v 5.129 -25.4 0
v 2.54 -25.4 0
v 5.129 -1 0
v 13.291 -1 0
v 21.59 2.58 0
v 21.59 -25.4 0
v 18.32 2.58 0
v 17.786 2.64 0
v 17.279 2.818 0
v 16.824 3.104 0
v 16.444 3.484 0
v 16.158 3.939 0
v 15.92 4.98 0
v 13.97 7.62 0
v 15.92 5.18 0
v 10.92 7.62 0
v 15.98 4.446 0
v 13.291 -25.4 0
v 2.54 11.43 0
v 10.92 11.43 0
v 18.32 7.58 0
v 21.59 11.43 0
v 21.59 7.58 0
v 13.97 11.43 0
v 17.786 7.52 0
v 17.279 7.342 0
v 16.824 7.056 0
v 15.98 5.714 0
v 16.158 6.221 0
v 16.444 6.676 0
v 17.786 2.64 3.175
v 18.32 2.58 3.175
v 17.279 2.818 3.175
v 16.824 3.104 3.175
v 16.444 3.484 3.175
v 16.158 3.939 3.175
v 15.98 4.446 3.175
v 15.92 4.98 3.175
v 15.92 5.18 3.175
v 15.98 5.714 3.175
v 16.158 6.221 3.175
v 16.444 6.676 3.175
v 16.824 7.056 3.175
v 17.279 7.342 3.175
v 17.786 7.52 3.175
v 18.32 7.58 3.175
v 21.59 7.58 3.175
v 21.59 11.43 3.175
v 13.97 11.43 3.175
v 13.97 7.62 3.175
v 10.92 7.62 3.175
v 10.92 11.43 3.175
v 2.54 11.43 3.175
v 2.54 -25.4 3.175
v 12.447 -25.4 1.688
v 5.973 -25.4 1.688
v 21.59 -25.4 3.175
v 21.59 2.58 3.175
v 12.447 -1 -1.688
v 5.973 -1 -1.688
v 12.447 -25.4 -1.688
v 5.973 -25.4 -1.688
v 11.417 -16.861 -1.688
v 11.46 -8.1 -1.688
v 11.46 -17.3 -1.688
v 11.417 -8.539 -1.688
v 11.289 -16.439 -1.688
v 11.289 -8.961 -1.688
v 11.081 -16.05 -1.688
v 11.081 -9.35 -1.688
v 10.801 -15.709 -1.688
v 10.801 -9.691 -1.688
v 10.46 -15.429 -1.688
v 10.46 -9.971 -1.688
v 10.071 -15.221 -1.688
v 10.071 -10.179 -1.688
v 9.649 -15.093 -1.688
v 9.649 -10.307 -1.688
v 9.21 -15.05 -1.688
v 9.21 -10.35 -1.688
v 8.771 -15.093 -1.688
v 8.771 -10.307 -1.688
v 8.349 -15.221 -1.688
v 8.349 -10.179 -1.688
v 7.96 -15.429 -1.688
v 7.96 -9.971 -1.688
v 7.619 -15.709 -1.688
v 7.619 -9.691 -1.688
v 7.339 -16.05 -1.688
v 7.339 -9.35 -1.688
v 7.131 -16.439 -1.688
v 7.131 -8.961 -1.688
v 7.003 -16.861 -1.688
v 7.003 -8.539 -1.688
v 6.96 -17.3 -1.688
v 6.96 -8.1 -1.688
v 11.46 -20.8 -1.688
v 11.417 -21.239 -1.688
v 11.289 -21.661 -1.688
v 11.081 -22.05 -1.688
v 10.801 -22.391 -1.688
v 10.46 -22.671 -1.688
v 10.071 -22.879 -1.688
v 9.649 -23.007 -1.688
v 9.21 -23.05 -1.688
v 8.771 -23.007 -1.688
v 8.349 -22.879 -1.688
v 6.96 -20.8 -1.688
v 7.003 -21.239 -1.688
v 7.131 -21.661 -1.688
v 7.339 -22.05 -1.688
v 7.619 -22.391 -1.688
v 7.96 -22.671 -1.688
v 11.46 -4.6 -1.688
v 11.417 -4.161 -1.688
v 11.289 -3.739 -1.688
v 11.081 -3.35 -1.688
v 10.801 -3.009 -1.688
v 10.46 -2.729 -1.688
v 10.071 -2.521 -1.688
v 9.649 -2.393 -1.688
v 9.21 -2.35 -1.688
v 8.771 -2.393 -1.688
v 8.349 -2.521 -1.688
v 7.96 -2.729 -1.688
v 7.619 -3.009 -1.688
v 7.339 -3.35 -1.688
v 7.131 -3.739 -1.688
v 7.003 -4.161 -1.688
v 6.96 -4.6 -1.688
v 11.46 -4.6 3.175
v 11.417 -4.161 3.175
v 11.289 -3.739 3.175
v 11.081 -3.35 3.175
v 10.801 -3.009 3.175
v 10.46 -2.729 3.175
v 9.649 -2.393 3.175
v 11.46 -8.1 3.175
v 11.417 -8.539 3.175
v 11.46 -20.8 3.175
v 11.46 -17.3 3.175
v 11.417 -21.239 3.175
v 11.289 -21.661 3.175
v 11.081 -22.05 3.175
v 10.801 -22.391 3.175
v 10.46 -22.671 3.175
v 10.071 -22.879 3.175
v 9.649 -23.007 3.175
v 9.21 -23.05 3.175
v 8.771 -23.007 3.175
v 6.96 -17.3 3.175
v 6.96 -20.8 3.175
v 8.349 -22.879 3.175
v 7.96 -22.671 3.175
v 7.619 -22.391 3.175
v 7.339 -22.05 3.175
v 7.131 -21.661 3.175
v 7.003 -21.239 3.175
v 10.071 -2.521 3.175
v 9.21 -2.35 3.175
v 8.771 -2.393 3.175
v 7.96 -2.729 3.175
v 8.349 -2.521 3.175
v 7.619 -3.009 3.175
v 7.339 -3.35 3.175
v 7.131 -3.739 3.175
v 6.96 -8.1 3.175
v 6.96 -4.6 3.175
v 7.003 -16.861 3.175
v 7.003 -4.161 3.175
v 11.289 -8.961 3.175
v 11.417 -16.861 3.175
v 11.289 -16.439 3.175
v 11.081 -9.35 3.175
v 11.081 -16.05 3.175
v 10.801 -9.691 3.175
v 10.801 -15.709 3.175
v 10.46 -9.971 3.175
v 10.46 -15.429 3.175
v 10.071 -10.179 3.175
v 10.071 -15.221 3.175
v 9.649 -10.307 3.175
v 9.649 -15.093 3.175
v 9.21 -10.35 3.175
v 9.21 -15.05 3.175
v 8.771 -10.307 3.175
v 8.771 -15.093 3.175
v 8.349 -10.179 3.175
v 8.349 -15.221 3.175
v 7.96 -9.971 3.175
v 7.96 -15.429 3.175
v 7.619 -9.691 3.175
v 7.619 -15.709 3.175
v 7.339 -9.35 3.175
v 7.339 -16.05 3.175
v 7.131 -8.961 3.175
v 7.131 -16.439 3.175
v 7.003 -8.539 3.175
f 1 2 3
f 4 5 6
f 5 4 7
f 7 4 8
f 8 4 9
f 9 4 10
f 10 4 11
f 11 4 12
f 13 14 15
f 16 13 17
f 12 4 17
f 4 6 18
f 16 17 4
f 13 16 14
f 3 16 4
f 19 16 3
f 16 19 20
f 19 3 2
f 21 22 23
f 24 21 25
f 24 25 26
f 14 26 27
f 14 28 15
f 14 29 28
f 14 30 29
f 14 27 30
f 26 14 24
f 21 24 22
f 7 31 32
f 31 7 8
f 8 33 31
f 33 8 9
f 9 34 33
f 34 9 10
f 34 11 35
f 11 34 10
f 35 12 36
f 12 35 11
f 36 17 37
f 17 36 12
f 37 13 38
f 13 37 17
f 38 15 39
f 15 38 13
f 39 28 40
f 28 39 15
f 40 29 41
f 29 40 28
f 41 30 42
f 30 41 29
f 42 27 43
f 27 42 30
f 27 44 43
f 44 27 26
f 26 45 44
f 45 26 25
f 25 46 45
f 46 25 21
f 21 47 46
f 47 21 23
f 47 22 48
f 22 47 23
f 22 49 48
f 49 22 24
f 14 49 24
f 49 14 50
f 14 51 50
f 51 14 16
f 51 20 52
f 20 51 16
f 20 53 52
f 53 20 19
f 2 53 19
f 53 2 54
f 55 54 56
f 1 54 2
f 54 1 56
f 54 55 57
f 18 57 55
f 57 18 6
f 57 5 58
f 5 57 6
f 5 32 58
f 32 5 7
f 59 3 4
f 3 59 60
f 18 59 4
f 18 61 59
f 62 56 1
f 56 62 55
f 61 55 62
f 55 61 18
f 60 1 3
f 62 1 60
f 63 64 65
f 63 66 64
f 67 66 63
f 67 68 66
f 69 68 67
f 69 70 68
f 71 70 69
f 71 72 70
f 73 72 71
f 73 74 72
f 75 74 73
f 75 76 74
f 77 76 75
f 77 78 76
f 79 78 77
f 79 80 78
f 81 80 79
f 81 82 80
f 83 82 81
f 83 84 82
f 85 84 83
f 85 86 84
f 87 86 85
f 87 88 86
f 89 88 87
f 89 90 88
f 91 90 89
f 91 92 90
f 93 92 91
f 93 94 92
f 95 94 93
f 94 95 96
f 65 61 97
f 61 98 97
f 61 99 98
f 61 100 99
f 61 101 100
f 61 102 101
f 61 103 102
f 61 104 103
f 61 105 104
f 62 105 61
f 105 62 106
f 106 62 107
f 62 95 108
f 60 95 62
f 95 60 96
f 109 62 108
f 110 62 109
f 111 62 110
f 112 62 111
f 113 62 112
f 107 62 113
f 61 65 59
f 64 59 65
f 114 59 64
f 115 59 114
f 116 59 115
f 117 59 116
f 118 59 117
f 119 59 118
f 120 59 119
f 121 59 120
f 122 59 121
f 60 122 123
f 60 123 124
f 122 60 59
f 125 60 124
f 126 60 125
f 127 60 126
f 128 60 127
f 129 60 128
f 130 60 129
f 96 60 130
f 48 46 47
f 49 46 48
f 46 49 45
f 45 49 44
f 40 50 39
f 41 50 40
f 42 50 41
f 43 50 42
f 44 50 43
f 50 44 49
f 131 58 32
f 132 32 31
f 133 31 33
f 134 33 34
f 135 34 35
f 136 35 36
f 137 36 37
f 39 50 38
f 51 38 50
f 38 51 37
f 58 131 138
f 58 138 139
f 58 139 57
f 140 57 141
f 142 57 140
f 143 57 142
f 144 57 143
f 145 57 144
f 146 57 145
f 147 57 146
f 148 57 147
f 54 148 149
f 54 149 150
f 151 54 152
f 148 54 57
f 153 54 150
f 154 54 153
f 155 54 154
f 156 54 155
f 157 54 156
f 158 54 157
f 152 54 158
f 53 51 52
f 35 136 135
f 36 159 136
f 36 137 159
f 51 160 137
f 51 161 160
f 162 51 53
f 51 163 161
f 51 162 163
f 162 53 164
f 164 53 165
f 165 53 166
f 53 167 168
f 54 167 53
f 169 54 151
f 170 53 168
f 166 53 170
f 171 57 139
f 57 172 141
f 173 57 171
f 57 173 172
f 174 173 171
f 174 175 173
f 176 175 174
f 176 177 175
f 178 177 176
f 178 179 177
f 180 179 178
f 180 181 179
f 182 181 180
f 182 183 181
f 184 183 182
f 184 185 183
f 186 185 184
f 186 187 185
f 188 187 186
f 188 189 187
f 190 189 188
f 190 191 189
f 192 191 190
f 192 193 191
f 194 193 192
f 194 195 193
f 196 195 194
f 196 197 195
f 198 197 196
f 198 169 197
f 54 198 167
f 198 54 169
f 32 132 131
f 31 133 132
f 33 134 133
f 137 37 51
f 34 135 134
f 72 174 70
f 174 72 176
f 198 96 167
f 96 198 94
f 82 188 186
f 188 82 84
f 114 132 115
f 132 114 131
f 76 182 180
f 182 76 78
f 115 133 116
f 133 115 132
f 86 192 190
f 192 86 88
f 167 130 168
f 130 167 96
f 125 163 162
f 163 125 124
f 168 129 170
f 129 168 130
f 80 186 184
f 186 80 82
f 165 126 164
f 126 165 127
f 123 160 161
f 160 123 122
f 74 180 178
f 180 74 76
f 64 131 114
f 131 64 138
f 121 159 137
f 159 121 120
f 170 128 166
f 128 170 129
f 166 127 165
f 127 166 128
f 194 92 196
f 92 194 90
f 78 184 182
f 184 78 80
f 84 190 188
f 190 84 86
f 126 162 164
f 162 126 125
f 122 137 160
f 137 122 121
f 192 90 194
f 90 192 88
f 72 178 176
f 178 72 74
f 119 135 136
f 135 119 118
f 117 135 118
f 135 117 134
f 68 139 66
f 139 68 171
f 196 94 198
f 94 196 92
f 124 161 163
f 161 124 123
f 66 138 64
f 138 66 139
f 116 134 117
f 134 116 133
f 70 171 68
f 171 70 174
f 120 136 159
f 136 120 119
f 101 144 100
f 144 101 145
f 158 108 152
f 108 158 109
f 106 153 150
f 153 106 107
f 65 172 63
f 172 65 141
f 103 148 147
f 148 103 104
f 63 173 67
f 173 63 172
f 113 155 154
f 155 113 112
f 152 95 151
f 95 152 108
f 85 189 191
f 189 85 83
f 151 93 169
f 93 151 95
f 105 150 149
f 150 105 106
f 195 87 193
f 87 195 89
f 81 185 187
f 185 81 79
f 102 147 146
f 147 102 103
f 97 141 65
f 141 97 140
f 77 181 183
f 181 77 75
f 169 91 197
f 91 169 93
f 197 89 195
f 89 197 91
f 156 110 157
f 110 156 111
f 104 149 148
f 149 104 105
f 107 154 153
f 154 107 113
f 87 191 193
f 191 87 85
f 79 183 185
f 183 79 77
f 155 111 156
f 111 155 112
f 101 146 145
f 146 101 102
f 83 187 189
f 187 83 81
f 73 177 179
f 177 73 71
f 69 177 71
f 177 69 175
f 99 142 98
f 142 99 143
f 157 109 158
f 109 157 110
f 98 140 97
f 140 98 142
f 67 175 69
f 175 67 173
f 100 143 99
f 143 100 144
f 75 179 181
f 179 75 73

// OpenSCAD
// file: ../lib/TOGComplexLib1.scad
function tcplx1_multiply(a, b) =
	[a[0]*b[0] - a[1]*b[1], a[0]*b[1] + a[1]*b[0]];
function tcplx1_divide(a, b) =
	let(bot = (b[0]*b[0] + b[1]*b[1]))
	[
		(a[0]*b[0] + a[1]*b[1])/bot,
		(a[1]*b[0] - a[0]*b[1])/bot
	];

assert([-11,23] == tcplx1_multiply([3,2], [1,7]));

assert([-1,3] == tcplx1_multiply([3,1], [0,1]));
assert([-1,3] == tcplx1_multiply([0,1], [3,1]));

echo(tcplx1_divide([-1,3], [3,1]));
assert([0,1] == tcplx1_divide([-1,3], [3,1]));

function tcplx1_normalize(vec) =
	let(veclen = sqrt(vec[0]*vec[0]+vec[1]*vec[1]))
	[vec[0] / veclen, vec[1] / veclen];

function tcplx1_relative_turnvec_vv(v0, v1) =
	tcplx1_divide(tcplx1_normalize(v1), tcplx1_normalize(v0));

function tcplx1_relative_turnvec_abc(p0, p1, p2) = tcplx1_relative_turnvec_vv(p1-p0, p2-p1);

// A 90-degree turn
assert([0,1] == tcplx1_relative_turnvec_abc([0,0], [1,0], [1,1]));
assert([0,1] == tcplx1_relative_turnvec_abc([0,0], [0,1], [-1,1]));

// A 45-degree turn
assert(tcplx1_normalize([1,1]) == tcplx1_relative_turnvec_abc([0,0], [1,0], [ 2,1]));
assert(tcplx1_normalize([1,1]) == tcplx1_relative_turnvec_abc([0,0], [0,1], [-1,2]));


function tcplx1_relative_angle_abc(p0, p1, p2) =
	let(turnvec = tcplx1_relative_turnvec_abc(p0, p1, p2))
	atan2(turnvec[1], turnvec[0]);

assert(-135 == tcplx1_relative_angle_abc([0,0], [1,0], [0,-1]));
assert( -90 == tcplx1_relative_angle_abc([0,0], [1,0], [1,-1]));
assert(   0 == tcplx1_relative_angle_abc([0,0], [1,0], [2, 0]));
assert(  90 == tcplx1_relative_angle_abc([0,0], [1,0], [1, 1]));
assert( 135 == tcplx1_relative_angle_abc([0,0], [1,0], [0, 1]));

assert(  90 == tcplx1_relative_angle_abc([1,1], [3,3], [1, 5]));
// file: ../lib/TOGArrayLib1.scad
// TOGArrayLib1.5
// 
// Functions for working with arrays.
// 
// v1.1:
// - tal1_reduce assert(is_list(items)) to prevent infinite recursion
//   when given undefined or other non-list values
// v1.1.1:
// - Fix tal1_uniq_remap_v2 to return "list-remap-result" as the
//   first element of the returned list
// v1.2:
// - Add tal1_replace_at function
// v1.3:
// - tal1_is_vec_of, tal1_is_vec_of_num
// v1.4:
// - tal1_assert_for_each, for when you want to assert something
//   about each of a list of items and get nice failure messages
// v1.5:
// - Add tal1_duplicate_reversed function, which may be
//   handy when generating symmetrical polygons and stuff.

/**
 * Make a list with the contents of list `a`,
 * but starting at offset `off`, replaced by the contents of list `b`.
 * len(result) = max(len(a), off+len(b))
 */
function tal1_replace_at(a, off, b, default_value=undef, default_value_function=undef) =
	assert(is_list(a))
	assert(is_list(b))
	let( _dvf = !is_undef(default_value_function) ? default_value_function : function(i) default_value )
[
	for( i=[0:1:min(off,len(a))-1] ) a[i],
	for( i=[len(a):1:off-1] ) _dvf(i),
	for( i=[off:1:off+len(b)-1] ) b[i-off],
	for( i=[off+len(b):1:len(a)-1] ) a[i],
];

// Simplest case
assert([] == tal1_replace_at([], 0, []));
// Second simplest cases
assert(["foo"] == tal1_replace_at(["foo"], 0, []));
assert(["foo"] == tal1_replace_at([], 0, ["foo"]));
// Replace one item
assert(["foo","quux","baz"] == tal1_replace_at(["foo","bar","baz"], 1, ["quux"]));
// Replace and extend
assert(["foo","quux","tuna","tina"] == tal1_replace_at(["foo","bar","baz"], 1, ["quux", "tuna", "tina"]));
// Add beyond end of `a`
assert(["foo","zzz","quux"] == tal1_replace_at(["foo"], 2, ["quux"], default_value="zzz"));
// Adding 'nothing' should still fill to that point with defaults
assert(["foo","zzz","zzz"] == tal1_replace_at(["foo"], 3, [], default_value="zzz"));


function tal1_reduce(start, items, func, offset=0) =
	assert(is_list(items))
	len(items) == offset ? start :
	tal1_reduce(func(start, items[offset]), items, func, offset+1);

function tal1_consecutive_duplicate_count(items) = tal1_reduce(
	[0, undef],
	items,
	function(z,item) [z[0] + (item == z[1] ? 1 : 0), item]
)[0];

assert(0 == tal1_consecutive_duplicate_count([]));
assert(0 == tal1_consecutive_duplicate_count([50]));
assert(1 == tal1_consecutive_duplicate_count([50,50]));
assert(0 == tal1_consecutive_duplicate_count([50,51,52,53]));
assert(1 == tal1_consecutive_duplicate_count([50,51,52,52]));
assert(3 == tal1_consecutive_duplicate_count([50,50,50,50]));

// Set test_size to arbirarily large values
// to ensure that OpenSCAD can handle heavy recursion
let(test_size=1000) assert(test_size/2 == tal1_consecutive_duplicate_count([for(i=[0:1:test_size-1]) floor(i/2)]));



function tal1_uniq_(items, off0, off1) =
	let(chunklen = off1-off0)
	chunklen == 0 ? [] :
	chunklen == 1 ? [items[off0]] :
	let(half=floor(chunklen/2))
	let(left  = tal1_uniq_(items, off0     , off0+half))
	let(right = tal1_uniq_(items, off0+half, off1     ))
	assert(len(left) > 0)
	assert(len(right) > 0)
	left[len(left)-1] == right[0] ? [each left, for(i=[1:1:len(right)-1]) right[i]] :
	[each left, each right];

/** Given a list of items, returns a new list with identical consecutive items merged */
function tal1_uniq(items) = tal1_uniq_(items, 0, len(items));

assert([] == tal1_uniq([]));
assert([123] == tal1_uniq([123]));
assert([55,0,1,2,3] == tal1_uniq([55,0,1,2,3]));
assert([55,0,1,2] == tal1_uniq([55,0,1,1,2]));
assert([55,0,1] == tal1_uniq([55,55,0,0,0,0,0,0,1,1,1,1]));
assert([55,0] == tal1_uniq([55,0,0,0,0,0,0,0]));



/**
 * Returns [new items, old index -> new index mapping].
 * No-op version.
 */
function tal1_uniq_remap_v1(items) =
	["list-remap-result", items, [for (vi=[0:1:len(items)-1]) vi]];

// [a, a, b, b, c, c]
//
// [a,    ...], []  -> [a],[0]
// [a, a, ...], [0] -> [a],[0,0]

assert([1,2,3] == [1,2,3]);

/**
 * Recursive version that will combine adjacent identical vertexes,
 * but will use the original items.
 */
function tal1_uniq_remap_v2(items, map=[]) =
	let(index = len(map))
	len(items) == index ? ["list-remap-result", items, map] :
	index == 0 ? tal1_uniq_remap_v2(items, [0]) :
	items[index] == items[map[index-1]] ? tal1_uniq_remap_v2(items, [for(vi=map) vi, map[index-1]]) :
	tal1_uniq_remap_v2(items, [for(vi=map) vi, index]);

assert(tal1_uniq_remap_v2([1,1,2,2,3,4]) == ["list-remap-result", [1,1,2,2,3,4], [0,0,2,2,4,5]]);


/**
 * Returns true if `vec` is a list of at least min_len items
 * and component_check(each item, even those beyond min_len) is true.
 */
function tal1_is_vec_of(vec, min_len=0, component_check=function(x) true) =
	assert(is_num(min_len) && min_len >= 0)
	assert(is_function(component_check))
	is_list(vec) && len(vec) >= min_len &&
	tal1_reduce(true, vec, function(prev,item) prev && component_check(item));

function tal1_is_vec_of_num(vec, min_len=0) = tal1_is_vec_of(vec, min_len, function(i) is_num(i));

assert( true == tal1_is_vec_of_num([1,2,3]));
assert( true == tal1_is_vec_of_num([]));
assert( true == tal1_is_vec_of_num([1,2,3], 3));
assert(false == tal1_is_vec_of_num([1,2], 3));
assert(false == tal1_is_vec_of_num([1,2,"spoon"], 3));
// Requirements are ambiguous when
// first min_len items are numbers, but there are non-numeric items afterwards,
// so let's error on the side of saying 'no, it's not a list of numbers';
// i.e. the item check and the min_len are independent.
assert(false == tal1_is_vec_of_num([1,2,3,"artichoke"], 3));


/**
 * Asserts that item_checker(each item in list, index of item)[0] is true.
 * Second element of item_checker return value is assertion message.
 * Returns the original list, in case that's useful to you.
 */
function tal1_assert_for_each(list, item_checker) =
	let( _ignored = [ for(i=[0:1:len(list)-1])
		let(q=item_checker(list[i],i))
		let(passed=is_bool(q) ? q : is_list(q) ? q[0] : assert(false, str(
			"tal1_assert_for_each: item_checker should return Bool|[Bool,String], but returned ",
			q, " for item at index ", i)))
		let(message=is_list(q) ? q[1] : undef)
		assert(passed, message)
		q
	])
	list;

// Callback can return a boolean...
assert([1,2,3] == tal1_assert_for_each([1,2,3], function(v,i) is_num(v)));
// ...or a [boolean, string]
assert([1,2,3] == tal1_assert_for_each([1,2,3], function(v,i) [is_num(v), "element be a num"]));

// [a, b, c] -> [a, b, c, rxf(c), rxf(b), rxf(a)]
function tal1_duplicate_reversed(list, rxf=function(item) item) =
	[
		each list,
		for( i=[len(list)-1 : -1 : 0] ) rxf(list[i]),
	];
// file: ../lib/TOGMod1Constructors.scad
// TOGMod1Constructors-v1.11
// 
// Functions to construct objects understood by TOGMod1
// 
// v1.1:
// - Add togmod1_make_rounded_rect
// v1.2:
// - togmod1_make_rounded_rect can make ovals
// v1.3:
// - togmod1_circle_points, to just get the points of a circle
// - if pos parameter to circle function has a third element,
//   returned vertexes will include it as the z component;
// v1.3.1
// - Some assertions
// v1.4:
// - Refactor togmod1_rounded_rect_points and togmod1_circle_points
//   to use togmod1__make_nd_vector_adder for adapting to whatever
//   `pos` parameter is.
// v1.5:
// - togmod_rounded_rect_points will not simplify completely rounded sides
//   (where length of side is exactly twice the rounding radius)
//   unless simplify_rounded_sides=true
//   - This makes it more useful for polyhedron generation,
//     where radius varies, but number of points must remain constant.
// v1.6:
// - togmod1_make_rect makes a simple rectangle
// - togmod1_make_rounded_rect will defer to togmod1_make_rect when r=0
// v1.7:
// - togmod1_make_circle will return empty shape (["union"]) when d=0
// v1.8:
// - Add togmod1_text
// v1.9:
// - togmod1_circle_points uses 3 as minimum circle point count instead of 6
// v1.10:
// - Fix togmod1_linear_extrude_y so that range corresponds to Y start/end and
//   polygon X,Y correspond to X,Z.  Previously it was rotated wrongly,
//   which would have gone unnoticed for symmetrical shapes centered at 0,0.
// v1.11:
// - Remove an 'echo'

use <./TOGArrayLib1.scad>

function togmod1__make_nd_vector_adder(origin=[0,0]) =
	let(origin_is_zero = tal1_reduce(true, origin, function(prev,item) prev && item == 0))
	origin_is_zero ? (function(vec) len(vec) >= len(origin) ? vec : tal1_replace_at(origin, 0, vec)) :
	function(vec) [
		for(i=[0:1:max(len(origin),len(vec))-1]) (len(vec) > i ? vec[i] : 0) + (len(origin) > i ? origin[i] : 0),
	];

assert([1,2,3] == togmod1__make_nd_vector_adder()([1,2,3]));
assert([1,2,3] == togmod1__make_nd_vector_adder([0,0,3])([1,2]));


function togmod1_make_cuboid(size) =
	assert(is_list(size))
	assert(len(size) >= 3)
	assert(is_num(size[0]))
	assert(is_num(size[1]))
	assert(is_num(size[2]))
	["polyhedron-vf", [
		[-size[0]/2, -size[1]/2, -size[2]/2],
		[+size[0]/2, -size[1]/2, -size[2]/2],
		[-size[0]/2, +size[1]/2, -size[2]/2],
		[+size[0]/2, +size[1]/2, -size[2]/2],
		[-size[0]/2, -size[1]/2, +size[2]/2],
		[+size[0]/2, -size[1]/2, +size[2]/2],
		[-size[0]/2, +size[1]/2, +size[2]/2],
		[+size[0]/2, +size[1]/2, +size[2]/2]
	], [
		[0,1,3,2],[0,4,5,1],[4,6,7,5],[3,7,6,2],[1,5,7,3],[6,4,0,2]
	]];

function togmod1_make_polygon(verts) =
	["polygon-vp", verts, [[for( i=[0:1:len(verts)-1] ) i%len(verts)]]];

function togmod1_rounded_rect_points(size, r, pos=[0,0], simplify_rounded_sides=false) =
	assert(is_list(size))
	assert(len(size) >= 2)
	let(radii = is_list(r) ? r : is_num(r) ? [r,r] : assert(false, "rounded_rect r(adius) should be list<num> or num"))
	let(rx = radii[0])
	let(ry = radii[1])
	assert(is_num(rx))
	assert(is_num(ry))
	assert(size[0] >= 2*rx, str("size[0] must be >= 2*r[0]; size[0] = ",size[0],", 2*r[0] = ",2*rx))
	assert(size[1] >= 2*ry, str("size[1] must be >= 2*r[1]; size[1] = ",size[1],", 2*r[1] = ",2*ry))
	let(quarterfn=max($fn/4, 1))
	let(qfnx = simplify_rounded_sides && size[0] == 2*rx ? quarterfn-1 : quarterfn)
	let(qfny = simplify_rounded_sides && size[1] == 2*ry ? quarterfn-1 : quarterfn)
	let(finalizepos = togmod1__make_nd_vector_adder(pos))
[
	for(a=[0 : 1 : qfnx]) let(ang=      a*90/quarterfn) finalizepos([ size[0]/2-rx + rx*cos(ang),  size[1]/2-ry + ry*sin(ang)]),
	for(a=[0 : 1 : qfny]) let(ang= 90 + a*90/quarterfn) finalizepos([-size[0]/2+rx + rx*cos(ang),  size[1]/2-ry + ry*sin(ang)]),
	for(a=[0 : 1 : qfnx]) let(ang=180 + a*90/quarterfn) finalizepos([-size[0]/2+rx + rx*cos(ang), -size[1]/2+ry + ry*sin(ang)]),
	for(a=[0 : 1 : qfny]) let(ang=270 + a*90/quarterfn) finalizepos([ size[0]/2-rx + rx*cos(ang), -size[1]/2+ry + ry*sin(ang)]),
];

function togmod1_make_rect(size) =
	togmod1_make_polygon([
		[-size[0]/2, -size[1]/2],
		[+size[0]/2, -size[1]/2],
		[+size[0]/2, +size[1]/2],
		[-size[0]/2, +size[1]/2],
	]);

function togmod1_make_rounded_rect(size, r) =
	r == 0 ? togmod1_make_rect(size) :
	togmod1_make_polygon(togmod1_rounded_rect_points(size,r,simplify_rounded_sides=true));

/**
 * Returns points for an approximation of a circle where points are at distance r from pos.
 * Can be used to make other regular polygons, but the faces will be less than that
 * distance from pos (do some trig if you want face distance, e.g. for a hex nut).
 */
function togmod1_circle_points(r, pos=[0,0], d=undef) =
	assert( !is_undef(r) || !is_undef(d) )
	assert(!is_undef(pos[0]))
	assert(!is_undef(pos[1]))
	let(finalizepos = togmod1__make_nd_vector_adder(pos))
	let(r_ = !is_undef(r) ? r : d/2)
	let(fn = max($fn, 3))
	[for(i=[0 : 1 : fn-1]) finalizepos([r_*cos(i*360/fn), r_*sin(i*360/fn)])];

function togmod1_make_circle(r, pos=[0,0], d=undef) =
	r == 0 || d == 0 ? ["union"] :
	togmod1_make_polygon(togmod1_circle_points(r=r, pos=pos, d=d));

function togmod1_make_cylinder(d, zrange=[0,1], r=undef, pos=[0,0]) =
	assert( !is_undef(r) || !is_undef(d) )
	let( r_ = !is_undef(r) ? r : d/2 )
	// TODO: Make polyhedron directly
	["linear-extrude-zs", zrange, togmod1_make_circle(r=r_, pos=pos)];

function togmod1__is_range1d(range) = is_list(range) && len(range) == 2 && is_num(range[0]) && is_num(range[1]);

function togmod1_linear_extrude_z(range, shape) =
	assert(togmod1__is_range1d(range))
	["linear-extrude-zs", range, shape];
function togmod1_linear_extrude_x(range, shape) =
	assert(togmod1__is_range1d(range))
	["rotate", [90, 0, 90], togmod1_linear_extrude_z(range, shape)];
function togmod1_linear_extrude_y(range, shape) =
	assert(togmod1__is_range1d(range))
	["rotate", [90, 0,  0], togmod1_linear_extrude_z([-range[1], -range[0]], shape)];

function togmod1_text(text, size, font, halign, valign, spacing, direction, language, script) =
	["text-tsfhvsdls", text, size, font, halign, valign, spacing, direction, language, script];
// file: ../lib/TOGMod1.scad
// TOGMod1.9
// OpenSCAD library for representing shapes
// 
// See also: Functional OpenSCAD (https://github.com/thehans/FunctionalOpenSCAD)
// 
// v1.8:
// - Add `text-tsfhvsdls`
// v1.9
// - Add `offset-ds` (offset with _d_elta a _s_hape)

module togmod1_domodule(mod) {
	assert(is_list(mod));
	assert(len(mod) > 0);
	if( mod[0] == "polygon-vp" ) {
		// ["polygon-vp", vertexes, paths]
		polygon(points=mod[1], paths=mod[2]);
	} else if( mod[0] == "polyhedron-vf" ) {
		polyhedron(mod[1], faces=mod[2]);
	} else if( mod[0] == "scale" ) {
		assert(len(mod) == 3);
		scale(mod[1]) togmod1_domodule(mod[2]);
	} else if( mod[0] == "translate" ) {
		assert(len(mod) == 3);
		assert(is_list(mod[1]));
		for(c=mod[1]) assert(is_num(c), "translate component should be numeric");
		translate(mod[1]) togmod1_domodule(mod[2]);
	} else if( mod[0] == "rotate" ) {
		assert(len(mod) == 3);
		rotate(mod[1]) togmod1_domodule(mod[2]);
	} else if( mod[0] == "intersection" ) {
		intersection_for( i=[1:1:len(mod)-1] ) togmod1_domodule(mod[i]);
	} else if( mod[0] == "difference" ) {
		difference() {
			togmod1_domodule(mod[1]);
			for( i=[2:1:len(mod)-1] ) togmod1_domodule(mod[i]);
		}
	} else if( mod[0] == "union" ) {
		for( i=[1:1:len(mod)-1] ) togmod1_domodule(mod[i]);
	} else if( mod[0] == "hull" ) {
		hull() for( i=[1:1:len(mod)-1] ) togmod1_domodule(mod[i]);
	} else if( mod[0] == "offset-rs" ) {
		assert(len(mod) == 3);
		assert(is_num(mod[1]));
		assert(is_list(mod[2]));
		offset(mod[1]) togmod1_domodule(mod[2]);
	} else if( mod[0] == "linear-extrude-zs" ) {
		// ["linear-extrude-zs", [z0,z1], 2d_shape] // centered
		// ["linear-extrude-zs", height, 2d_shape]
		let( zrange = is_list(mod[1]) ? mod[1] : [-mod[1]/2, mod[1]/2] ) {
			translate([0,0,zrange[0]]) linear_extrude(zrange[1]-zrange[0]) togmod1_domodule(mod[2]);
		}
	} else if( mod[0] == "render" ) {
		render() togmod1_domodule(mod[1]);
	} else if( mod[0] == "minkowski" ) {
		minkowski() {
			togmod1_domodule(mod[1]);
			togmod1_domodule(mod[2]);
		}
	} else if( mod[0] == "x-debug" ) {
		# togmod1_domodule(mod[1]);
	} else if( mod[0] == "x-color" ) {
		color(mod[1]) togmod1_domodule(mod[2]);
	} else if( mod[0] == "text-tsfhvsdls" ) {
		text(text=mod[1], size=mod[2], font=mod[3], halign=mod[4], valign=mod[5], spacing=mod[6], direction=mod[7], language=mod[7], script=mod[8]);
	} else if( mod[0] == "offset-ds" ) {
		assert(is_num(mod[1]));
		assert(is_list(mod[2]));
		offset(delta=mod[1]) togmod1_domodule(mod[2]);
	} else {
		assert(false, str("Unrecognized shape: ", mod[0]));
	}
}
// main file
// PCIBracketSlotCover0.5
// 
// See
// - [OC] https://web.archive.org/web/20221220092125/https://www.overclock.net/threads/guide-to-drawing-pci-e-and-atx-mitx-rear-io-bracket-for-a-custom-case.1589018/
// - [CEM] https://web.archive.org/web/20201112014246/http://read.pudn.com/downloads166/ebook/758109/PCI_Express_CEM_1.1.pdf
//
// Width between slots = 20.32mm
// Width of main part of bracket = 18.42 (b1 + w1 + b2)
// 
// Connector opening is 12.06mm wide and roughly centered on the tab at the bottom of the bracket,
// Assuming this is centered on the main section, that would be x = 3.18mm to 15.24mm.
// 89.90mm tall, from -100.36mm to -10.46mm (See [CEM] p73)
// 
// Versions:
// v0.1 (p1597):
// - 1mm thick bracket
// - stickey-outey bit to test if it actually fits in the 'connector opening'
//   (it does, at least in the AlamenCase)
// v0.2 (p1598):
// - 'buzpwr flacket' - bracket without top clip for holding
//   a momentary button (one of Jon's smaller ones because I ran out of my usual bulky ones)
//   and a round 11.7mm-diameter buzzer
// v0.3 (p1599):
// - The top clip thing
// - Remove "_make" prefixes from function names
// v0.4 (p1600):
// - Oval instead of circular holes in the clip
// v0.5 (p1601):
// - Start the lineup post at y=-1mm instead of right at 0

module __pcibsc0__end_params() { }

use <../lib/TOGMod1.scad>
use <../lib/TOGMod1Constructors.scad>
use <../lib/TOGPath1.scad>
use <../lib/TOGPolyhedronLib1.scad>

$fn = 32;


pcibsc0_default_z1 = 64.13 - 59.05; /* front of bracket to center of hole; see [OEM] p73 */
pcibsc0_default_thickness = 0.9;
pcibsc0_default_body_width = 18.42; /* main body width */
pcibsc0_default_overhang = 11.43;

pcibsc0_lineup_post_center_x = pcibsc0_default_body_width/2;

//pcibsc0_visible_hole_positions = [-15.875, -92.075]; // -5/8 and -3-5/8
//pcibsc0_alt_hole_positions = [-15.875, -79.375]; // -5/8 and -2-5/8

function pcibsc0_z_hole_positions( atoms ) = [for(a=atoms) a*12.7 - 9.525];

pcibsc0_visible_hole_positions = pcibsc0_z_hole_positions([-0.5, -6.5]);
pcibsc0_alt_hole_positions = pcibsc0_z_hole_positions([-0.5, -4.5]);

// Makes the shape as seen from inside the computer
function pcibsc0_back_rath(
	w0 =  21.59 /* width from right edge to left of top */,
	h1 = 112.75 /* about 4+7/16 * inch */,
	b1 =   4.12 /* left bottom bevel */,
	w2 = pcibsc0_default_body_width,
	w1 =  10.19 /* bottom stickey-outey bit */,
	h2 =   7.14 /* about 9/32" */,
	h3 =   4.56 /* height of top right stickey-outey bit */,
	h4 =   2.92 /* height of top unbeveled section of top-right stickey-outey bit */,
	h5 =   3.08 /* height of top unbeveled section of top-right cutout */,
	b5 =   2.54 /* width and height of top-left cutout bevel */,
	h9 =   0.86 /* thickness of top bit */,
	er =   1    /* extra rounding, not part of spec */
) =
let( b2 = w2 - w1 - b1 /* right bottom bevel, 4.11mm */ )
["togpath1-rath",
	["togpath1-rathnode", [0 + b5          , 0 + h9       ], ["round", er]],
	["togpath1-rathnode", [0 + b5          , 0 - h5       ]],
	["togpath1-rathnode", [0               , 0 - h5 - b5  ], ["round", er]],
	["togpath1-rathnode", [0               , 0 - h1 + b1  ], ["round", er]],
	["togpath1-rathnode", [0 + b1          , 0 - h1       ]],
	["togpath1-rathnode", [0 + b1          , 0 - h1 - h2  ], ["round", 1.91]],
	["togpath1-rathnode", [0 + b1 + w1     , 0 - h1 - h2  ], ["round", 1.91]],
	["togpath1-rathnode", [0 + b1 + w1     , 0 - h1       ]],
	["togpath1-rathnode", [0 + w2          , 0 - h1 + b2  ], ["round", er]],
	["togpath1-rathnode", [0 + w2          , 0 - h3       ]],
	["togpath1-rathnode", [0 + w0 - h3 + h4, 0 - h3       ], ["round", er]],
	["togpath1-rathnode", [0 + w0          , 0 - h4       ], ["round", er]],
	["togpath1-rathnode", [0 + w0          , 0 + h9       ], ["round", er]],
];

function pcibsc0_side_rath(
	z2 = 11.43 /* Overhang; [OEM] p75 */,
	z3 =  1 /* Thickness */,
	h9 =  3 /* thickness of top */,
	er =  1,
) = ["togpath1-rath",
	["togpath1-rathnode", [   0, 0 ]],
	["togpath1-rathnode", [   0,-z2]],
	["togpath1-rathnode", [  h9,-z2]],
	["togpath1-rathnode", [  h9, z3], ["round", er]],
	["togpath1-rathnode", [-200, z3]],
	["togpath1-rathnode", [-200, 0 ]],
];

function pcibsc0_bracket(
	z1 = pcibsc0_default_z1,
	z2 = pcibsc0_default_overhang /* Overhang */,
	w0 = 21.59,
	w2 = pcibsc0_default_body_width,
	h9 = 3,
// k... are all for the little square hole.
// I'm not bothering to fold it in for pinching the rail.
	k1 = 10.92, k2 = 13.97, kz = 3.81,
	lineup_circle = togmod1_linear_extrude_z([-50,50], togmod1_make_circle(d=4.5)),
	connector_bump_height = 3
) =
let( kd = k2-k1 )
["difference",
	["union",
		["intersection",
			togmod1_linear_extrude_z([-50,50], togmod1_make_polygon(togpath1_rath_to_polypoints(pcibsc0_back_rath(h9=100)))),
			togmod1_linear_extrude_x([-50,50], togmod1_make_polygon(togpath1_rath_to_polypoints(pcibsc0_side_rath(z2=z2, h9=3)))),
		],
		if( connector_bump_height > 0 ) ["translate", [w2/2, (0 - 100.36 - 10.46)/2, -connector_bump_height/2 + 0.1], togmod1_make_cuboid([11,100.36 - 10.46, connector_bump_height+0.2])]
	],
	["translate", [w0, 0, -z1], togmod1_linear_extrude_y([-10,10], togmod1_make_rounded_rect([(w0-18.42+2.21)*2, 4.42], r=2.2))],
	["translate", [(k1+k2)/2, 0, -z2], togmod1_linear_extrude_y([-10,10], togmod1_make_rect([kd, kz*2]))],

	for( y=pcibsc0_visible_hole_positions ) ["translate", [w2/2, y, 0], lineup_circle],
];

// Flacket = bracket not including the overhang

function pcibsc0_flacket_side_rath(
	body_thickness,
	bottom_tab_thickness = 0.9,
	bottom_tab_y0 = -200 /* Bottom of bottom tab; large negative number because this will be intersected */,
	bottom_tab_y1 = -100 /* Top of bottom tab, below whick thickness = bottom_tab_thickness */,
	bt_bevel_size = 8 /* Bevel between tab and body */,
	lr =  6,  // Large radius
	er =  1,  // Extra radius
) = let(
	btt = bottom_tab_thickness,
	bdt = body_thickness,
	btb = min(bt_bevel_size, bdt - btt - er*2 - 0.1),
	bty0 = bottom_tab_y0,
	bty1 = bottom_tab_y1,
	bty2 = bty1 + bdt - btt
) ["togpath1-rath",
	["togpath1-rathnode", [    0      , 0            ]],
	["togpath1-rathnode", [    0      , 0 + bdt      ]],
	//["togpath1-rathnode", [ bty1 + btb, 0 + bdt      ], ["round", er]],
	//["togpath1-rathnode", [ bty1 + btb, 0 + btt + btb], ["round", er]],
	["togpath1-rathnode", [ bty2      , 0 + bdt      ], ["round", lr]],
	["togpath1-rathnode", [ bty1      , 0 + btt      ], ["round", lr]],
	["togpath1-rathnode", [ bty0      , 0 + btt      ]],
	["togpath1-rathnode", [ bty0      , 0            ]],
];

function pcibsc0_pseudohex_rath( xmin, xmaj, ymaj, offset=0) =
let(
	ops = offset > 0 ? [["offset", offset]] : []
) ["togpath1-rath",
	["togpath1-rathnode", [ xmaj/2, 0     ], each ops],
	["togpath1-rathnode", [ xmin/2, ymaj/2], each ops],
	["togpath1-rathnode", [-xmin/2, ymaj/2], each ops],
	["togpath1-rathnode", [-xmaj/2, 0     ], each ops],
	["togpath1-rathnode", [-xmin/2,-ymaj/2], each ops],
	["togpath1-rathnode", [ xmin/2,-ymaj/2], each ops],
];

function pcibsc0_pseudohex( xmin, xmaj, ymaj, offset=0) =
	togmod1_make_polygon(togpath1_rath_to_polypoints(pcibsc0_pseudohex_rath(xmin, xmaj, ymaj, offset=offset)));

function pcibsc0_lineup_post_2d(offset=0) =
	pcibsc0_pseudohex(6.35, 7.9375, 3.175, offset=offset);

function pcibsc0_flacket(
	thickness = pcibsc0_default_thickness,
	w2 = pcibsc0_default_body_width,
	hs_hole = togmod1_linear_extrude_y([-10,10], togmod1_make_circle(d=5))
) = let(
	clip_lineup_hole = togmod1_linear_extrude_z([-1,thickness+1], togmod1_make_circle(d=4.5)),
	clip_lineup_profile = pcibsc0_lineup_post_2d(offset=0.1),
	clip_lineup_slot = togmod1_linear_extrude_z([-1,thickness+1], clip_lineup_profile)
) ["difference",
	["intersection",
		togmod1_linear_extrude_z([0,thickness*2], togmod1_make_polygon(togpath1_rath_to_polypoints(pcibsc0_back_rath(h9=0)))),
		togmod1_linear_extrude_x([-50,50], togmod1_make_polygon(togpath1_rath_to_polypoints(pcibsc0_flacket_side_rath(thickness)))),
	],
	
	for( z=[ 6.35 : 12.7 : thickness-3.175] )	["translate", [w2/2, 0, z], hs_hole],
	
	["translate", [w2/2, 0, 0], clip_lineup_slot],
	
	for( y=pcibsc0_alt_hole_positions ) ["translate", [w2/2, y, 0], clip_lineup_hole],
];

function pcibsc0_buzpwr_flacket(
	thickness = 19.05
) = let(
	w2 = pcibsc0_default_body_width
) ["difference",
	pcibsc0_flacket(thickness),
		
	// Underside rack, which is hard to print and also too tight:
	//["translate", [w2/2, (-1.5-3/8)*25.4, 0], togmod1_make_cuboid([12.7 + 0.4, 76.2 + 0.4, 12.7])],
	//["translate", [w2/2, (-1.5-3/8)*25.4, 0], togmod1_make_cuboid([12.7 + 0.2, 50.8 + 0.4, thickness*3])],
	
	// Power button hole
	["translate", [w2/2, 25.4 * (-9/8), 0], tphl1_make_z_cylinder(zds=[[-1, 12.7], [14,12.7], [16,8.5], [thickness+1, 8.5]])],
	
	// Buzzer hole
	["translate", [w2/2, 25.4 * (-17/8), 0], tphl1_make_z_cylinder(zds=[[-1, 6.35], [6.35,6.35], [6.35,12.7], [thickness+1,12.7]])]
];

function pcibsc0_top_rath(
	back_depth  = 25.4,
	front_depth = pcibsc0_default_overhang,
	z1 = pcibsc0_default_z1,
	w0 = 21.59,
	w2 = pcibsc0_default_body_width,
	k1 = 10.92, k2 = 13.97, kz = 3.81,
	shd = 5 // 4.42 // screw hole diameter; nominally 4.42, but I add some margin
) = ["togpath1-rath",
	["togpath1-rathnode", [w0      , - back_depth]],
	["togpath1-rathnode", [w0      ,   z1 + shd/2]],
	["togpath1-rathnode", [w2-shd/2,   z1 + shd/2], ["round", shd/2-0.1]],
	["togpath1-rathnode", [w2-shd/2,   z1 - shd/2], ["round", shd/2-0.1]],
	["togpath1-rathnode", [w0      ,   z1 - shd/2]],
	["togpath1-rathnode", [w0      ,  front_depth]],
	["togpath1-rathnode", [k2      ,  front_depth]],
	["togpath1-rathnode", [k2      ,  front_depth - kz]],
	["togpath1-rathnode", [k1      ,  front_depth - kz]],
	["togpath1-rathnode", [k1      ,  front_depth]],
	["togpath1-rathnode", [2.54    ,  front_depth]],
	["togpath1-rathnode", [2.54    , - back_depth]],
];

function pcibsc0_top_clip(back_depth, thickness) = let(
	cx = pcibsc0_lineup_post_center_x,
	hs_hole = togmod1_linear_extrude_z([-10,10], togmod1_make_rounded_rect([4.5,8], 2.25))
) ["difference",
	["intersection",
		["union",
			togmod1_linear_extrude_z([0, thickness+1], togmod1_make_polygon(togpath1_rath_to_polypoints(pcibsc0_top_rath(back_depth)))),
			["translate", [cx,0,0], togmod1_linear_extrude_y([-back_depth, -1], pcibsc0_lineup_post_2d(0.1))],
		],
		togmod1_linear_extrude_z([-50, thickness], togmod1_make_rect([100,100])),
	],
	for( y=[ 6.35 : 12.7 : back_depth-3.175] ) ["translate", [cx, -y, 0], hs_hole],
];

//togmod1_domodule(pcibsc0_bracket());
//togmod1_domodule(pcibsc0_buzpwr_flacket());

togmod1_domodule(pcibsc0_top_clip(25.4, 3.175));
